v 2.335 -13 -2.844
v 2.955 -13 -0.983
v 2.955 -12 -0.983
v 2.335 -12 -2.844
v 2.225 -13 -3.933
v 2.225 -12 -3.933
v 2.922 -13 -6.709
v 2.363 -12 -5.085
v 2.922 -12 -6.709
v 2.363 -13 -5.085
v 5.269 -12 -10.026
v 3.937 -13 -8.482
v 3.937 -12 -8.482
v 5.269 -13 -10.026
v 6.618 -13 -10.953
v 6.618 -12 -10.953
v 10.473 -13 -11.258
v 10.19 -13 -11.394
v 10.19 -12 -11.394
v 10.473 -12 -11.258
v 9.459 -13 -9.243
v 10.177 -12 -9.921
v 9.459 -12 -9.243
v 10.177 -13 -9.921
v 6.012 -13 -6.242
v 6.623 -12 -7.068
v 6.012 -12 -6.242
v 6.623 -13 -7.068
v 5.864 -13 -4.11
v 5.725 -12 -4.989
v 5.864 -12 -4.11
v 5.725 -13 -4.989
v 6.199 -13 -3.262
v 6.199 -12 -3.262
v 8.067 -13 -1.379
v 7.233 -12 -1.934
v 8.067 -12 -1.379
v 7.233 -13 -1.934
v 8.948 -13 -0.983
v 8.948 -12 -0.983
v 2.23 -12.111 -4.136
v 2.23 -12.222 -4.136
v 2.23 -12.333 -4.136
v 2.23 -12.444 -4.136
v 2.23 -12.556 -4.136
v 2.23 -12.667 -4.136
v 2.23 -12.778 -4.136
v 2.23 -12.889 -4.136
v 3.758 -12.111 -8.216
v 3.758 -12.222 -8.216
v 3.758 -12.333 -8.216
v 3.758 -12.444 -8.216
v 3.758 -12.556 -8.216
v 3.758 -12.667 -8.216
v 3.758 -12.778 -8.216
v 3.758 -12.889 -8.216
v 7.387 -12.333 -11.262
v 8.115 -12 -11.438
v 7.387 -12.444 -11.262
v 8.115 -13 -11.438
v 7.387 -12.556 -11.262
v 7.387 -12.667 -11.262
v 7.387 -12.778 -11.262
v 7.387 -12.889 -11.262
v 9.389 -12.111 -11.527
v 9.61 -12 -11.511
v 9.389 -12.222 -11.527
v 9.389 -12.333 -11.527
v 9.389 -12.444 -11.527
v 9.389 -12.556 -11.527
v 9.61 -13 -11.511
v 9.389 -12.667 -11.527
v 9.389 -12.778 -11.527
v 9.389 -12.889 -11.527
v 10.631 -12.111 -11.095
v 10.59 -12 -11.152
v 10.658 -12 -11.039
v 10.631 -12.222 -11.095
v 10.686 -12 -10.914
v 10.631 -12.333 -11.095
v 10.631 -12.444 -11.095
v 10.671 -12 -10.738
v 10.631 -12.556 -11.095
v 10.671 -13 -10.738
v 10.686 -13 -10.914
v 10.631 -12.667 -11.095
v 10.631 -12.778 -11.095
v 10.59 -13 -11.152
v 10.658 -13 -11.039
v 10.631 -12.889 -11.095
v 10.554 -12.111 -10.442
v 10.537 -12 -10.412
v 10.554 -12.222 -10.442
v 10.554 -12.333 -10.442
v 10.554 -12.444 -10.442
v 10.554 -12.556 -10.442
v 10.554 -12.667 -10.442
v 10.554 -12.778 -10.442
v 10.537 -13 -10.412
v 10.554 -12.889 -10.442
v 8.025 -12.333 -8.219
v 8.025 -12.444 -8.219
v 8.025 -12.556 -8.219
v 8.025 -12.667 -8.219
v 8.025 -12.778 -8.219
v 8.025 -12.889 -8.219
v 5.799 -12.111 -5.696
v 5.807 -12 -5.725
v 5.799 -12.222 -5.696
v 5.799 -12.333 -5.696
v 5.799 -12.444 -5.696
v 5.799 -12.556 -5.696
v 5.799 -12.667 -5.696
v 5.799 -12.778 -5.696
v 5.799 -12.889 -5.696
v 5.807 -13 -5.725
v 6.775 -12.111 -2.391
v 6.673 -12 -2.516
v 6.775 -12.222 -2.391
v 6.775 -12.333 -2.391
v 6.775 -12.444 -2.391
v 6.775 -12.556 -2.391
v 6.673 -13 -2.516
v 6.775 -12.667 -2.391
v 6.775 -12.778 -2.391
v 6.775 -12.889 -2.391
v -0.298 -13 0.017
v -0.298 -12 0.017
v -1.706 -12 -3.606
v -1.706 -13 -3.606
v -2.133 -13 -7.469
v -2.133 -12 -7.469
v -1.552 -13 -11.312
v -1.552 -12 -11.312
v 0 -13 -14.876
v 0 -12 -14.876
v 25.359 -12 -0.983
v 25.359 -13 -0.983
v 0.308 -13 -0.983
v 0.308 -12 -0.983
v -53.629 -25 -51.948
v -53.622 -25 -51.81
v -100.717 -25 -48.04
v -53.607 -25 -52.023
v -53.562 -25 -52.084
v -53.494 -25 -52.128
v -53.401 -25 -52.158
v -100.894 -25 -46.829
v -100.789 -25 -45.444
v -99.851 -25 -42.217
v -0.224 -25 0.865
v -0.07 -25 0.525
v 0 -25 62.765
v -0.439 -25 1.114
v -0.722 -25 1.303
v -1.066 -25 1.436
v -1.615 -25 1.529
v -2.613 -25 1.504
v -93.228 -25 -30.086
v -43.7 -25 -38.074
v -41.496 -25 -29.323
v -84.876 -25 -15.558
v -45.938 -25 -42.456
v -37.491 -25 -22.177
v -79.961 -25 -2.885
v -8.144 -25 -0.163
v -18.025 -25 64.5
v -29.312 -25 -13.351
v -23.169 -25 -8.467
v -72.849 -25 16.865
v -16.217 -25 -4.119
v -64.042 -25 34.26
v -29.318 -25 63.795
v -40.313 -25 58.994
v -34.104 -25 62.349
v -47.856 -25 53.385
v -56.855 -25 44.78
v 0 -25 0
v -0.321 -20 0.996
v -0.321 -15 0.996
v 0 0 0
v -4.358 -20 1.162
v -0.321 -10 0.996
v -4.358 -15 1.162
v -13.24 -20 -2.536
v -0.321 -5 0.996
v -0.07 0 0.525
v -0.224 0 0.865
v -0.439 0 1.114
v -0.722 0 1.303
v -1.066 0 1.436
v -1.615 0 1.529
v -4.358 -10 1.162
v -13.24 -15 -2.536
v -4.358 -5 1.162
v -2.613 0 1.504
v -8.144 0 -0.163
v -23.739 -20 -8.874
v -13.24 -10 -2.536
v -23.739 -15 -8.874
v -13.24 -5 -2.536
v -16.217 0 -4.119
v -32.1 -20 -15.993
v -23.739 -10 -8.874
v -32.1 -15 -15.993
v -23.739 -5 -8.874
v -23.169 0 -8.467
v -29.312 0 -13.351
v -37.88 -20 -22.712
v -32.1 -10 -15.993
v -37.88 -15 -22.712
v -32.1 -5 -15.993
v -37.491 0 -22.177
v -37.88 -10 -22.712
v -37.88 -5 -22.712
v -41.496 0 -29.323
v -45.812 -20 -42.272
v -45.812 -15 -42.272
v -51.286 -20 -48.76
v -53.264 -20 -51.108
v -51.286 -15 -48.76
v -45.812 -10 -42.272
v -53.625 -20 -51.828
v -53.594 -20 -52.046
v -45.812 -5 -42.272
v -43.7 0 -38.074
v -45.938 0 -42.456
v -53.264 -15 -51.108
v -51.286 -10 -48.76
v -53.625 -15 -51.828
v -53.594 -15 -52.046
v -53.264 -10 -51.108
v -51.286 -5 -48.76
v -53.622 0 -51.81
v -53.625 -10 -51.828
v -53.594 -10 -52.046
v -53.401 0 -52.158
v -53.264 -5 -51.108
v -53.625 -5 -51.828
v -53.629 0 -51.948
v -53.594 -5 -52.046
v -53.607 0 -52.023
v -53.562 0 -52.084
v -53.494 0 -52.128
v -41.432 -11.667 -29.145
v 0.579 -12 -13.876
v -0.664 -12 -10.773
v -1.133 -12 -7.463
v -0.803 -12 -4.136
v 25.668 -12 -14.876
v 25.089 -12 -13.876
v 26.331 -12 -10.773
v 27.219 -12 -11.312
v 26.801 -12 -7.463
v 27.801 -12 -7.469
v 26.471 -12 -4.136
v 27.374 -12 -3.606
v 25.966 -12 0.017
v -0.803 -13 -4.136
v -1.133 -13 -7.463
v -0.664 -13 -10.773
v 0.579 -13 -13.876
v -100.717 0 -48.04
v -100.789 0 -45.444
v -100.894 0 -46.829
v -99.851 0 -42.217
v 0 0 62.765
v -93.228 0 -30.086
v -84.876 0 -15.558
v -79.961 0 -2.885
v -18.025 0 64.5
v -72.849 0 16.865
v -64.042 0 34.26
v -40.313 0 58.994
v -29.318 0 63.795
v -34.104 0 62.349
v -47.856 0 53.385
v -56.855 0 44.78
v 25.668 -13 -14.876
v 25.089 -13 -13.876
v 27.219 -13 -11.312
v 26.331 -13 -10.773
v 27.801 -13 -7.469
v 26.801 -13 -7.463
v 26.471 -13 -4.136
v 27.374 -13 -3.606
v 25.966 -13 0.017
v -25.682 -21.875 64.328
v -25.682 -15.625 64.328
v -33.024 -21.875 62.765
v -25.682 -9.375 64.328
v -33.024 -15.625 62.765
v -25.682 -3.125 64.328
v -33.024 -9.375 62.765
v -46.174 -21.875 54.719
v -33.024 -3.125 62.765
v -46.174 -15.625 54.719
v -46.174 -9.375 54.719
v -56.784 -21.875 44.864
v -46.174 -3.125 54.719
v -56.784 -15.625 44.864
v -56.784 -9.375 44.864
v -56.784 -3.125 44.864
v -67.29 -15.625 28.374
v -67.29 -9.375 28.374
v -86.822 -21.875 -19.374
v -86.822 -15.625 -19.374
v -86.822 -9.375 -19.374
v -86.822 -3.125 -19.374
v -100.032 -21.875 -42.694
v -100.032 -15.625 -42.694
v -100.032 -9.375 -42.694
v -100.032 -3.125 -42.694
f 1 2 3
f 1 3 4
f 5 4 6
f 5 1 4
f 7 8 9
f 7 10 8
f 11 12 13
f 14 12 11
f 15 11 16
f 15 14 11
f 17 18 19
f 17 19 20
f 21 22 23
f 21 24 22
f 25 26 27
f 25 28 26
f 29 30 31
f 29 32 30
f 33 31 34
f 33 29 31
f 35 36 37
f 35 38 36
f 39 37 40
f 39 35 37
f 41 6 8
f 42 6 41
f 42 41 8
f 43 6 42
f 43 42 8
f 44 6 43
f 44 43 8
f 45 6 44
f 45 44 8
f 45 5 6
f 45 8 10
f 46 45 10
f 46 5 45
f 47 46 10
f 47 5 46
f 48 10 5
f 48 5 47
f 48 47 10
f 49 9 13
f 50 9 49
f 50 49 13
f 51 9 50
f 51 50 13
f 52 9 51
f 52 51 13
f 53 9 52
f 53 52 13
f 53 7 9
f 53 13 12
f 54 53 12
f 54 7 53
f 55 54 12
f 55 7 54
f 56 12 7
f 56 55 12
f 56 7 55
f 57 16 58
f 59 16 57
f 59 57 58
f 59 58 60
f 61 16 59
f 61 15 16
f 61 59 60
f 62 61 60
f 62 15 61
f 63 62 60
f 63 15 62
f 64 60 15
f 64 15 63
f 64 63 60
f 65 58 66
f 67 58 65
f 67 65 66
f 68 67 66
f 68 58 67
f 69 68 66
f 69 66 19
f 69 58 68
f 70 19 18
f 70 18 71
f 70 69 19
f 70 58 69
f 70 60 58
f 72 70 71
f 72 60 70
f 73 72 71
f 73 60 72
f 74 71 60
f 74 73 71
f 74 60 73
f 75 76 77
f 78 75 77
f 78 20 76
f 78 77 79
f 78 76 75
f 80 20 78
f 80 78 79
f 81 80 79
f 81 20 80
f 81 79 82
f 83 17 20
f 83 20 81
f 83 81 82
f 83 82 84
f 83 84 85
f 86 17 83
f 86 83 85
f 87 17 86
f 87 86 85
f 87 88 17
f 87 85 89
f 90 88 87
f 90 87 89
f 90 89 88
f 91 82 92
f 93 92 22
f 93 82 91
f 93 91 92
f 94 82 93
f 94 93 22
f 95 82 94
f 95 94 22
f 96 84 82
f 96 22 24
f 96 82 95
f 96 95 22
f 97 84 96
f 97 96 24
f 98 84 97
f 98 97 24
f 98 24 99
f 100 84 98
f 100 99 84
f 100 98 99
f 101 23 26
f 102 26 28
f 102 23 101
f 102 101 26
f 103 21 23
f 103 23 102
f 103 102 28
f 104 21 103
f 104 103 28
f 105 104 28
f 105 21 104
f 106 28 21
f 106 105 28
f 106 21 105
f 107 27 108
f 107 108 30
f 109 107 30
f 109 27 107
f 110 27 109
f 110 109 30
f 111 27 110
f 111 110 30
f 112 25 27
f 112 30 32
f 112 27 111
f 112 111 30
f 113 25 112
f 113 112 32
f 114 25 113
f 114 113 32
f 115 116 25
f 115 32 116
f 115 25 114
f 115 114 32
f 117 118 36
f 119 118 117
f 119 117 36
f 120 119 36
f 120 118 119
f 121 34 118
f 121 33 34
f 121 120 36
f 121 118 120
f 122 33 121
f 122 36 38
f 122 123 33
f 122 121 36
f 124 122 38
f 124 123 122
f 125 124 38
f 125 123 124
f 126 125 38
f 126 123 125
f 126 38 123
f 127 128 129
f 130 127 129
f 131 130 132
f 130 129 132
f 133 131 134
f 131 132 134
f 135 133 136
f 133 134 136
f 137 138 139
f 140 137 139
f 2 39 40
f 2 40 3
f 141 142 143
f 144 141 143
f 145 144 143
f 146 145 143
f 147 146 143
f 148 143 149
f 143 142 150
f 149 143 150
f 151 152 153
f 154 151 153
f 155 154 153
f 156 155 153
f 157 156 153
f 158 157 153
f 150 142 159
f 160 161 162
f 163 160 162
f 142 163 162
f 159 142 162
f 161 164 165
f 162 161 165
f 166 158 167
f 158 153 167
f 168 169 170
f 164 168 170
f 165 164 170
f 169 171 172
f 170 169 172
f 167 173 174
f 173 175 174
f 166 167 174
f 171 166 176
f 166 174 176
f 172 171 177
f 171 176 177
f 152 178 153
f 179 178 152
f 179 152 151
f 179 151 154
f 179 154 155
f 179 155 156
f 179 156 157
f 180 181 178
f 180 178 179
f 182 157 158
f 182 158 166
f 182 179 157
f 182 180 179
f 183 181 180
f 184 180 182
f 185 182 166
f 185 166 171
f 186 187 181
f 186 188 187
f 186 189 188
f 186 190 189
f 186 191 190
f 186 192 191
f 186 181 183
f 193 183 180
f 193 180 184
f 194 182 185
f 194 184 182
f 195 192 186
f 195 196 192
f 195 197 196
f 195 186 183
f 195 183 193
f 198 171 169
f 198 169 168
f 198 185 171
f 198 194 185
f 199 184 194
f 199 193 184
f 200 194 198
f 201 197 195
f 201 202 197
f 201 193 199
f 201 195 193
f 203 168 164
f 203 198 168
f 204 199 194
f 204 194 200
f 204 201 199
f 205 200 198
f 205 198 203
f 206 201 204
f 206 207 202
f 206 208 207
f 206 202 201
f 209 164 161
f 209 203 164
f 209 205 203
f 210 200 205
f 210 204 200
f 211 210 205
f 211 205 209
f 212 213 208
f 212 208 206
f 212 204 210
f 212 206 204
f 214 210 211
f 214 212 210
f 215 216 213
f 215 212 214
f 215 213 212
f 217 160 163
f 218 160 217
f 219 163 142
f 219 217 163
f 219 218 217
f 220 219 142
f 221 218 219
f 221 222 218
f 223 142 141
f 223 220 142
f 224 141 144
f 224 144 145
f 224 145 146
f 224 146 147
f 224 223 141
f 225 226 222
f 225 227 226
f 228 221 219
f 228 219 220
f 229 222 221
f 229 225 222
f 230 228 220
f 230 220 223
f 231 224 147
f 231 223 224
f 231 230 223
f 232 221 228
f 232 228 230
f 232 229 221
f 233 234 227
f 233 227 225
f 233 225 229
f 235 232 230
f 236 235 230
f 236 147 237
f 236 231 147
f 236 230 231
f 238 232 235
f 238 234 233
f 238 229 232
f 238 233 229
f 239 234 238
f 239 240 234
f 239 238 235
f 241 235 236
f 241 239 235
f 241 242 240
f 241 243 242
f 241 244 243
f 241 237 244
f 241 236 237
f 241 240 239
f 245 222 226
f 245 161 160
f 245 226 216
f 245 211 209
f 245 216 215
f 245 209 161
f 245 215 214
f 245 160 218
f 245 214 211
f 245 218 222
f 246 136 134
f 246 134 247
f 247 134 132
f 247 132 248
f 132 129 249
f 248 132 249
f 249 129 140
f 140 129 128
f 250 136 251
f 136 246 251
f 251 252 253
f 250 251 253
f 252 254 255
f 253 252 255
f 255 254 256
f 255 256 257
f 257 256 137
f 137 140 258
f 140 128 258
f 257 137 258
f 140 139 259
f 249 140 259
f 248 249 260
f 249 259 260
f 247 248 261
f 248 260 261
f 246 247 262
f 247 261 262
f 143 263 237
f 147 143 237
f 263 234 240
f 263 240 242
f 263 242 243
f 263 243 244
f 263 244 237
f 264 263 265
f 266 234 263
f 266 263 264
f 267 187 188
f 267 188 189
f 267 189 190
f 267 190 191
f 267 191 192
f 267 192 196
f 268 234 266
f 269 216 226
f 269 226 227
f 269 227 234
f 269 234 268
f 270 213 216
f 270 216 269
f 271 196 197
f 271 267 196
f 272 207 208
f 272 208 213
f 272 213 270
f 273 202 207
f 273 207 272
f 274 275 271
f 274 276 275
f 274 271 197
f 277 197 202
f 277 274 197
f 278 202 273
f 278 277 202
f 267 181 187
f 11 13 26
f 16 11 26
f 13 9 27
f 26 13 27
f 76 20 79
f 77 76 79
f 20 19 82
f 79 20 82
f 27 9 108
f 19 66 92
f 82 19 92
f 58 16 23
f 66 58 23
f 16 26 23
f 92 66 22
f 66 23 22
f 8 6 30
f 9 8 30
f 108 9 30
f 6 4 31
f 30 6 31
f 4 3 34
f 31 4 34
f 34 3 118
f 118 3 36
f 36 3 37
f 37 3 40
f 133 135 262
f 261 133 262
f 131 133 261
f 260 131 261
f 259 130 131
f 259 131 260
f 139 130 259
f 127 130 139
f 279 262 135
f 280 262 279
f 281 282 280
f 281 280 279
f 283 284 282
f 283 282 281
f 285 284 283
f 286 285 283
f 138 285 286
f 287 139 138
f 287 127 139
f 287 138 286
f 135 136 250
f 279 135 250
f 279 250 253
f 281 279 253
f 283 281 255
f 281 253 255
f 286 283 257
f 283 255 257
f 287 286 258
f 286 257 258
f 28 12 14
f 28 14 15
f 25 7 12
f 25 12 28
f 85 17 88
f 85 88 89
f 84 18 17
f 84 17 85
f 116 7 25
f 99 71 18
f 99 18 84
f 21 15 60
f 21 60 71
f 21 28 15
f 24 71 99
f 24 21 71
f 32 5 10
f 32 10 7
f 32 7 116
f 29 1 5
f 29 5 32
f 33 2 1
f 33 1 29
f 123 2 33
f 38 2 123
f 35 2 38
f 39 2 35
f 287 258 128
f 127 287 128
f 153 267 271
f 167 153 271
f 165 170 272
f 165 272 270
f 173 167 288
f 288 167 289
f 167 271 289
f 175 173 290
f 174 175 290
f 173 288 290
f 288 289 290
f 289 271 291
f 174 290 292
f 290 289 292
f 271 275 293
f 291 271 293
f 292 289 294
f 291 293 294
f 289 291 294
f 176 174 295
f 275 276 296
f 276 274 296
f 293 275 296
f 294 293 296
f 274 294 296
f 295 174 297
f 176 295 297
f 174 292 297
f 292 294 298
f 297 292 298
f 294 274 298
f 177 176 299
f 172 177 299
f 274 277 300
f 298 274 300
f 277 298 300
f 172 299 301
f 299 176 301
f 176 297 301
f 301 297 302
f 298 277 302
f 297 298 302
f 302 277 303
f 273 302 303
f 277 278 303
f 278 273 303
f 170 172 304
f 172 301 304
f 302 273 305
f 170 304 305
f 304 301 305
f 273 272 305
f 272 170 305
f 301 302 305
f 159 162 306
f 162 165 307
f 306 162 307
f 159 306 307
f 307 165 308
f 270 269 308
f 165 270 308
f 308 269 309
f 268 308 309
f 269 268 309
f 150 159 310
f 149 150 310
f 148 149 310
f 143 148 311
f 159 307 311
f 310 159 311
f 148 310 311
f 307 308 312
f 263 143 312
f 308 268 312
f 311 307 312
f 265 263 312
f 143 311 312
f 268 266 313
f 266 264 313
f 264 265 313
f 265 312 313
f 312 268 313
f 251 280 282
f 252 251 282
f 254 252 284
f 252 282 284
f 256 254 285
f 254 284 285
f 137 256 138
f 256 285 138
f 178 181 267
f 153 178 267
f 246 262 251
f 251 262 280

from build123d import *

# Parameters (mm, degrees)
F1_DEPTH = 25
F3_DEPTH = 1
F6_DEPTH = 13.0010001
F8_DEPTH = 1


with BuildPart() as f1:
    # F0 (on Front) → F1 (new body)
    with BuildSketch(Plane.XZ):
        with BuildLine():
            add(Edge.make_bspline(
                [(0, 0), (0, 3.4083144274), (-16.6549813741, -3.2320742065), (-32.0311581493, -14.6211575017), (-43.3669660673, -29.3745837617), (-42.2863415878, -41.1619123461), (-54.8915026972, -51.8595739448), (-53.4006319743, -52.1576157642)],
                knots=[0, 0, 0, 0, 0.1860858001, 0.4300383958, 0.6365859105, 0.8216787516, 0.9947951303, 0.9947951303, 0.9947951303, 0.9947951303], degree=3))
            Line((0, 0), (0, 62.765))
            add(Edge.make_bspline(
                [(0, 62.765), (-5.5803138545, 63.7060054226), (-17.7846741419, 64.8728993234), (-33.3677106974, 64.2657058885), (-46.4495900747, 54.7326189691), (-57.592300277, 45.3035539124), (-67.8209095657, 28.267240425), (-78.1080050837, 5.7247986196), (-83.4130805825, -18.1439880956), (-102.3368853739, -42.4874116283), (-100.7174625993, -48.0397306383)],
                knots=[0, 0, 0, 0, 0.1171636173, 0.2256099251, 0.3343892274, 0.4398163618, 0.5623254612, 0.6982797919, 0.8436281409, 1, 1, 1, 1], degree=3))
            Line((-100.7174625993, -48.0397306383), (-53.4006319743, -52.1576157642))
        make_face()
    extrude(amount=F1_DEPTH)


with BuildPart() as f3:
    # F2 (on Front) → F3 (new body)
    with BuildSketch(Plane.XZ):
        with BuildLine():
            Line((25.9660863789, 0.0174377142), (-0.2982162396, 0.0174377142))
            ThreePointArc((-0.2982162396, 0.0174377142), (-2.1332085332, -7.4691667501), (0, -14.8763163015))
            Line((0, -14.8763163015), (25.6678701393, -14.8763163015))
            ThreePointArc((25.6678701393, -14.8763163015), (27.8010786725, -7.4691667501), (25.9660863789, 0.0174377142))
        make_face()
    extrude(amount=F3_DEPTH)


with BuildPart() as f3_1:
    # F4: moved
    add(f3.part.moved(Location((0, -12, 0))))

    # F5 (on face) → F6 (cut, through all)
    with BuildSketch(Plane.XZ.offset(13)):
        with BuildLine():
            Line((0.5790065625, -13.8763163015), (25.0888635768, -13.8763163015))
            ThreePointArc((25.0888635768, -13.8763163015), (26.8010048388, -7.4625237611), (25.3593870907, -0.9825622858))
            Line((25.3593870907, -0.9825622858), (0.3084830487, -0.9825622858))
            ThreePointArc((0.3084830487, -0.9825622858), (-1.1331346994, -7.4625237611), (0.5790065625, -13.8763163015))
        make_face()
    extrude(amount=-F6_DEPTH, mode=Mode.SUBTRACT)


with BuildPart() as f8:
    # F7 (on face) → F8 (new body)
    with BuildSketch(Plane.XZ.offset(13)):
        with BuildLine():
            Line((8.9481789619, -0.9825622858), (2.9548949096, -0.9825622858))
            add(Edge.make_bspline(
                [(2.9548949096, -0.9825622858), (2.5280445902, -1.9786113454), (1.7664584568, -4.1919341723), (3.5449416563, -8.4365367966), (6.7472864505, -11.7472984064), (11.4353371147, -11.5719426774), (9.9126533497, -9.4437177641), (8.0472075098, -8.2999458011), (4.9981559546, -5.9454601786), (6.5088606114, -2.0672568949), (8.1781559475, -1.2901534359), (8.9481789619, -0.9825622858)],
                knots=[0, 0, 0, 0, 0.1126486397, 0.2433554846, 0.379653427, 0.4925083836, 0.5697644239, 0.6681105723, 0.7829739383, 0.8992222474, 1, 1, 1, 1], degree=3))
        make_face()
    extrude(amount=-F8_DEPTH)


solid = Compound([f1.part, f3_1.part, f8.part])
